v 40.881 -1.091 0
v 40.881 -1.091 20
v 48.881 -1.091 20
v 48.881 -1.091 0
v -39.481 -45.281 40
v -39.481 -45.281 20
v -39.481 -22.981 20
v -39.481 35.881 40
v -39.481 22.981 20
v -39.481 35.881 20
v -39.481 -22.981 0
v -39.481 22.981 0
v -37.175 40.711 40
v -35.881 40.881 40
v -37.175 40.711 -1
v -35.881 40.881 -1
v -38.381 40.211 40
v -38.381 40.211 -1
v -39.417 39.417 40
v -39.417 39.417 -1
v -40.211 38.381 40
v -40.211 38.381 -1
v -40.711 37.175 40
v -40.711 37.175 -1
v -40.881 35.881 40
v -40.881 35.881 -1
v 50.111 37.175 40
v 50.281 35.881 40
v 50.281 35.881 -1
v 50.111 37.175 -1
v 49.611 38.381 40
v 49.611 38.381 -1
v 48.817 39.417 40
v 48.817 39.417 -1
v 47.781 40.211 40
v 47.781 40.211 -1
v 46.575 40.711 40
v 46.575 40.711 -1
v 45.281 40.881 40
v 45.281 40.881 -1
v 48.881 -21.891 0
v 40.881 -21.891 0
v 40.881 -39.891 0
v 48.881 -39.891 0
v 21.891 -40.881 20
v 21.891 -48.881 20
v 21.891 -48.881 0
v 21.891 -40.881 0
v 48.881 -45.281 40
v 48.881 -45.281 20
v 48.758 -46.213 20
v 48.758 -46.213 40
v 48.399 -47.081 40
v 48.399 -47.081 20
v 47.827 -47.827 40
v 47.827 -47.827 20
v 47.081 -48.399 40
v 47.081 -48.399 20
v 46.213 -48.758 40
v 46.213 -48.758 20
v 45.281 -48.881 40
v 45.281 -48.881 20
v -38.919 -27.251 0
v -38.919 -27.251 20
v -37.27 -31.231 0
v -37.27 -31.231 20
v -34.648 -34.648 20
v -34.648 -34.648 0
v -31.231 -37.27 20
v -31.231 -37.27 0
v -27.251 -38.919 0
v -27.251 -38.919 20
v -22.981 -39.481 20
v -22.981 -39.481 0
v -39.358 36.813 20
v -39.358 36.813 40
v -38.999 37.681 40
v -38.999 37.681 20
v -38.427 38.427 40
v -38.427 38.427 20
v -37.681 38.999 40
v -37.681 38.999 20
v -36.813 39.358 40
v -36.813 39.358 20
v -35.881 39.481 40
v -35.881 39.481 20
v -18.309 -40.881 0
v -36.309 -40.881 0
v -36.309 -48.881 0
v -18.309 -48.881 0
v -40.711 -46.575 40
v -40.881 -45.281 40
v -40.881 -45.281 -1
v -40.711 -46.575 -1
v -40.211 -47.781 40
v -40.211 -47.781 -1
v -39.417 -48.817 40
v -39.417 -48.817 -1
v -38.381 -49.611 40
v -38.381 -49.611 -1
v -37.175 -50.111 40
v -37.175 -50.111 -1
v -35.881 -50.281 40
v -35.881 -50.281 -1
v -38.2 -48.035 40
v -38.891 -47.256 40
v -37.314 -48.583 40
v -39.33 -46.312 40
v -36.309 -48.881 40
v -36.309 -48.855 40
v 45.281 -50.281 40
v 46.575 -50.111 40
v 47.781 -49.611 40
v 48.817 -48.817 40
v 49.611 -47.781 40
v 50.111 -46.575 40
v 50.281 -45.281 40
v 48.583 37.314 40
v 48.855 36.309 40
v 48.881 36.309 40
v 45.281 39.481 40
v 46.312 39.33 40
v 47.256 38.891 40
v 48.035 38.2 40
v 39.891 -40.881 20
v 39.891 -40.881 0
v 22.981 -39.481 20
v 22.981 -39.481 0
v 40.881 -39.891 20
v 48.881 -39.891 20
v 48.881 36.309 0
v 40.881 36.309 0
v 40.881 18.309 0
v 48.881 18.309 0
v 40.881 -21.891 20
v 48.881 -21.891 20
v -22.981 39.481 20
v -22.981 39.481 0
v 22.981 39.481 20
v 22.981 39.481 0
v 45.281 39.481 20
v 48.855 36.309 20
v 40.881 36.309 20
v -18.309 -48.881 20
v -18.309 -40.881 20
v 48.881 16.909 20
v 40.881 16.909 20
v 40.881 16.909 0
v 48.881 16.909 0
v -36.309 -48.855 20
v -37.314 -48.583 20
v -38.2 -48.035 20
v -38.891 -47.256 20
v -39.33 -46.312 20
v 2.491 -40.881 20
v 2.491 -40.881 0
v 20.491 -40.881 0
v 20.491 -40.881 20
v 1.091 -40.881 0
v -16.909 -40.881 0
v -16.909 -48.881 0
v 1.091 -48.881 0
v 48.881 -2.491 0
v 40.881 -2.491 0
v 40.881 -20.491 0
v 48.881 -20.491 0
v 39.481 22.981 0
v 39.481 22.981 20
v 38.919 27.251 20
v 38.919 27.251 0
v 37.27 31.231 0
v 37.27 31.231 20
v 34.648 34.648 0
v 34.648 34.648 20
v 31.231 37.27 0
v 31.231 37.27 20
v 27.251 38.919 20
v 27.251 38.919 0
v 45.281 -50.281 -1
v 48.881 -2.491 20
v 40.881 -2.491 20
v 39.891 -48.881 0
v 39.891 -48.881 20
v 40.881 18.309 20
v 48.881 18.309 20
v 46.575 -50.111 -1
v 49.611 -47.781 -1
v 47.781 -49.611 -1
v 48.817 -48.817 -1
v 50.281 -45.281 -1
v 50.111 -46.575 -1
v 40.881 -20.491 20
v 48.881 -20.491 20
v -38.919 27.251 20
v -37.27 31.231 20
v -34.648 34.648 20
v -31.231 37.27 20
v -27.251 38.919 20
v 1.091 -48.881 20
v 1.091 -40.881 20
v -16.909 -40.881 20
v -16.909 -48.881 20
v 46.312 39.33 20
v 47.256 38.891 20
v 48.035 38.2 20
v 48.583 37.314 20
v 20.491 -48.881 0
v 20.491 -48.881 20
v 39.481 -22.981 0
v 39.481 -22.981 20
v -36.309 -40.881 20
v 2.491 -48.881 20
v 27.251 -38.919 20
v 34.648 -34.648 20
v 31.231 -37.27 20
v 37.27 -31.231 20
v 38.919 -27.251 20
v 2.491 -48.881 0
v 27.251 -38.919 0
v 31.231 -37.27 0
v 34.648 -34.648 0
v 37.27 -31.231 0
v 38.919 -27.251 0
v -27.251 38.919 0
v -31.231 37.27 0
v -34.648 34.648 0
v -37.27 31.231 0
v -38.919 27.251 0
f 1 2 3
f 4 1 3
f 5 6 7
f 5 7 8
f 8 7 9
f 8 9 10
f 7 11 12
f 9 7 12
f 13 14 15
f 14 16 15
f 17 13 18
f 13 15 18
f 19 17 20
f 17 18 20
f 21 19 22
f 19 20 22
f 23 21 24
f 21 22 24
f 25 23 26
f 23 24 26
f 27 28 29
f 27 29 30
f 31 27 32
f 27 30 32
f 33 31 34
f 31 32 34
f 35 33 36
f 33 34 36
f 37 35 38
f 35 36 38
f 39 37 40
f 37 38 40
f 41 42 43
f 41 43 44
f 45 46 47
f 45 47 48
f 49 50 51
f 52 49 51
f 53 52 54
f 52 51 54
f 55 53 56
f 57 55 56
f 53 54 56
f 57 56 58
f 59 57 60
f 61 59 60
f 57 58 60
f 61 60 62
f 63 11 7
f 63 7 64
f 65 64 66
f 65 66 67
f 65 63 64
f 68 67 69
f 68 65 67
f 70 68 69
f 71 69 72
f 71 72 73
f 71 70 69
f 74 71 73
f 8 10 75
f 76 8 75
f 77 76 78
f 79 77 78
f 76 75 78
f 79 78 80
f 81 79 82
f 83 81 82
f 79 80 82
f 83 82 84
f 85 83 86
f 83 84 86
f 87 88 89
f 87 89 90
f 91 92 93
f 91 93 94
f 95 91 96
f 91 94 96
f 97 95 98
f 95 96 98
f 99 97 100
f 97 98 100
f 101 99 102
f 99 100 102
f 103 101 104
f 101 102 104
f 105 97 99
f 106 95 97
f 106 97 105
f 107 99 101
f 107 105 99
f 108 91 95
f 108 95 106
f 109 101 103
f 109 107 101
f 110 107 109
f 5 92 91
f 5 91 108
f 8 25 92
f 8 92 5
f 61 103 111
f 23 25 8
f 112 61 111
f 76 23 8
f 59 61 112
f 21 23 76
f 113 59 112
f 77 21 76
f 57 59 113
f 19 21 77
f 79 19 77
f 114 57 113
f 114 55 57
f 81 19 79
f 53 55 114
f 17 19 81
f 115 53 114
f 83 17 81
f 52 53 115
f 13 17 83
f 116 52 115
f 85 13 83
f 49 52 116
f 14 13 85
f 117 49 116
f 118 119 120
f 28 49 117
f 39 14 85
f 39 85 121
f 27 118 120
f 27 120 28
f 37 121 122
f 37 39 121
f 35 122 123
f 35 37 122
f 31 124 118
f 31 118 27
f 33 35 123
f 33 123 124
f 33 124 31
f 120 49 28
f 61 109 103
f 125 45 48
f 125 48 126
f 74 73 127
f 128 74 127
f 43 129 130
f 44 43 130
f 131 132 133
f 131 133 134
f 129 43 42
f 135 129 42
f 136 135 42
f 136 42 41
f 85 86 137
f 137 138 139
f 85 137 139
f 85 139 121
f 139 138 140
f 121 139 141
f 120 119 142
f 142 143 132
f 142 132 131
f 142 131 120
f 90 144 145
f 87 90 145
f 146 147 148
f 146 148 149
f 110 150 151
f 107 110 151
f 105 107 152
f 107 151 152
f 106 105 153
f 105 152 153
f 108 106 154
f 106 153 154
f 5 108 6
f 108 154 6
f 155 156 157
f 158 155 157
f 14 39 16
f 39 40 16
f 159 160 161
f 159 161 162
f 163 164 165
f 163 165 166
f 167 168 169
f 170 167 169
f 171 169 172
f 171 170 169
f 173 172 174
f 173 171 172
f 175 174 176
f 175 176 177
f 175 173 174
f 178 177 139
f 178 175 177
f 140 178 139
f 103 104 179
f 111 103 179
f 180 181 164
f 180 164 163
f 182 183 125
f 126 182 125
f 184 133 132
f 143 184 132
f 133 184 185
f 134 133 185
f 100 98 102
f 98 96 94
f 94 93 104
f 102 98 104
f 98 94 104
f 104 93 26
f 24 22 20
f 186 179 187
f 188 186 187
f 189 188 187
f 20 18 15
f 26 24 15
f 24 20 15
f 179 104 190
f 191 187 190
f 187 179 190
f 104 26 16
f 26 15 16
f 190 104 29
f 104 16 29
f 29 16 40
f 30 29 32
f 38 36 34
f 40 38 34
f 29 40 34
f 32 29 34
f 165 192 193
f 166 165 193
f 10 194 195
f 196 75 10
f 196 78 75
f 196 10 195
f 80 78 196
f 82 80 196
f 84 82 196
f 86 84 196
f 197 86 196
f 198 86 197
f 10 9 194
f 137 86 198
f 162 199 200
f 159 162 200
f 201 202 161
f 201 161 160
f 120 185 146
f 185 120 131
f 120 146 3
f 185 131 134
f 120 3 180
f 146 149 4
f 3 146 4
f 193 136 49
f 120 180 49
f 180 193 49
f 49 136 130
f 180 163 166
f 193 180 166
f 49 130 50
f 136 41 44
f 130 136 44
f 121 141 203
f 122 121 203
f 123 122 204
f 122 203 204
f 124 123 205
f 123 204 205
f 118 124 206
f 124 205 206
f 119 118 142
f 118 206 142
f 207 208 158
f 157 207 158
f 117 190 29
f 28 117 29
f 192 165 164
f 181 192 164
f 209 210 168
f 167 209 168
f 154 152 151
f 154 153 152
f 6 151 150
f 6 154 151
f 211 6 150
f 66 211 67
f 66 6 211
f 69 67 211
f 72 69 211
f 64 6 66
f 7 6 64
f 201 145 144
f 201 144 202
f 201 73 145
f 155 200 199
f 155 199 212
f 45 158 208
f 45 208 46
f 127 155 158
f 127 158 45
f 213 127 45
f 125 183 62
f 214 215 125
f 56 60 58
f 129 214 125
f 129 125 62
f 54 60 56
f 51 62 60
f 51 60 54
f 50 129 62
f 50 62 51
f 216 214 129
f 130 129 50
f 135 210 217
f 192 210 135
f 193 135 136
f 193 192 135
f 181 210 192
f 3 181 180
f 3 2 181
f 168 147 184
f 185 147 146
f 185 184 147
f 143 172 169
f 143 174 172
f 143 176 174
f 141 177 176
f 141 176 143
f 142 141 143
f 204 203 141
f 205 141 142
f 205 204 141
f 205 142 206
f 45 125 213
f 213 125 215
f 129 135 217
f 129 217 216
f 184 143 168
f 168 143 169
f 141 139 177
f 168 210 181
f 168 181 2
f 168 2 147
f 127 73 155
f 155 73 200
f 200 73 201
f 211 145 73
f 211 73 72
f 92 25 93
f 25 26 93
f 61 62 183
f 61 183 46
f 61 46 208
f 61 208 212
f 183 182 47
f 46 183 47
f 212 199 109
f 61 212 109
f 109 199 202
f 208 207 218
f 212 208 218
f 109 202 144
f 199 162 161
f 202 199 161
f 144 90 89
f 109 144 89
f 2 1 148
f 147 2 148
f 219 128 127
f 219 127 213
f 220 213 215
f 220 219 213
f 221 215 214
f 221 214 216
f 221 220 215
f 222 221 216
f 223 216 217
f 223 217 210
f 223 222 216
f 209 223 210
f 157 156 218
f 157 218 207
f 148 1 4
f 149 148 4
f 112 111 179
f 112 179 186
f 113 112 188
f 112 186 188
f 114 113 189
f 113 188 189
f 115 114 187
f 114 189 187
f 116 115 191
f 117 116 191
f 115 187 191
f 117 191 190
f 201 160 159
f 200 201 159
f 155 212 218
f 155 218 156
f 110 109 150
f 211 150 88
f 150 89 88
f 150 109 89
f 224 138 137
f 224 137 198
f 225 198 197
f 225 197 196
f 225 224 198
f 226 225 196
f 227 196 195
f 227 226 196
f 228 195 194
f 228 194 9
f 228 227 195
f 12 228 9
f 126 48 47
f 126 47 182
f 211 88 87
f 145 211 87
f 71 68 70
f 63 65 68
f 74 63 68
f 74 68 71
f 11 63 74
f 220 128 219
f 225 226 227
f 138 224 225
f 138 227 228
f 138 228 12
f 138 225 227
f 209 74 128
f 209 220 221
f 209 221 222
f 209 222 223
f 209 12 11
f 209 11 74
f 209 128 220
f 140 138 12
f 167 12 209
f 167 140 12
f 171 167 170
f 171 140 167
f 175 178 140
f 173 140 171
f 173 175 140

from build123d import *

# Parameters (mm, degrees)
F0_W     = 18
F0_H     = 8
F0_R     = 16.5
F0_W_2   = 8
F0_H_2   = 18
F1_DEPTH = 1
F2_DEPTH = 20
F4_DEPTH = 20
F6_DEPTH = 20


with BuildPart() as f1:
    # F0 (on Top) → F1 (new body)
    with BuildSketch(Plane.XY):
        with BuildLine():
            Line((45.2809703886, 40.8809703886), (-35.8809703886, 40.8809703886))
            ThreePointArc((-35.8809703886, 40.8809703886), (-39.4165042945, 39.4165042945), (-40.8809703886, 35.8809703886))
            Line((-40.8809703886, 35.8809703886), (-40.8809703886, -45.2809703886))
            ThreePointArc((-40.8809703886, -45.2809703886), (-39.4165042945, -48.8165042945), (-35.8809703886, -50.2809703886))
            Line((-35.8809703886, -50.2809703886), (45.2809703886, -50.2809703886))
            ThreePointArc((45.2809703886, -50.2809703886), (48.8165042945, -48.8165042945), (50.2809703886, -45.2809703886))
            Line((50.2809703886, -45.2809703886), (50.2809703886, 35.8809703886))
            ThreePointArc((50.2809703886, 35.8809703886), (48.8165042945, 39.4165042945), (45.2809703886, 40.8809703886))
        make_face()
        with Locations((-27.3089791051, -44.8809703886)):
            Rectangle(F0_W, F0_H, mode=Mode.SUBTRACT)
        with Locations((-7.9089791051, -44.8809703886)):
            Rectangle(F0_W, F0_H, mode=Mode.SUBTRACT)
        with Locations((-22.9809703886, -22.9809703886)):
            Circle(F0_R, mode=Mode.SUBTRACT)
        with Locations((11.4910208949, -44.8809703886)):
            Rectangle(F0_W, F0_H, mode=Mode.SUBTRACT)
        with Locations((30.8910208949, -44.8809703886)):
            Rectangle(F0_W, F0_H, mode=Mode.SUBTRACT)
        with Locations((44.8809703886, -30.8910208949)):
            Rectangle(F0_W_2, F0_H_2, mode=Mode.SUBTRACT)
        with Locations((22.9809703886, -22.9809703886)):
            Circle(F0_R, mode=Mode.SUBTRACT)
        with Locations((44.8809703886, -11.4910208949)):
            Rectangle(F0_W_2, F0_H_2, mode=Mode.SUBTRACT)
        with Locations((-22.9809703886, 22.9809703886)):
            Circle(F0_R, mode=Mode.SUBTRACT)
        with Locations((44.8809703886, 7.9089791051)):
            Rectangle(F0_W_2, F0_H_2, mode=Mode.SUBTRACT)
        with Locations((22.9809703886, 22.9809703886)):
            Circle(F0_R, mode=Mode.SUBTRACT)
        with Locations((44.8809703886, 27.3089791051)):
            Rectangle(F0_W_2, F0_H_2, mode=Mode.SUBTRACT)
        with Locations((-22.9809703886, 22.9809703886)):
            Circle(F0_R)
        with Locations((22.9809703886, 22.9809703886)):
            Circle(F0_R)
        with Locations((22.9809703886, -22.9809703886)):
            Circle(F0_R)
        with Locations((-22.9809703886, -22.9809703886)):
            Circle(F0_R)
        with Locations((44.8809703886, 27.3089791051)):
            Rectangle(F0_W_2, F0_H_2)
        with Locations((44.8809703886, 7.9089791051)):
            Rectangle(F0_W_2, F0_H_2)
        with Locations((44.8809703886, -11.4910208949)):
            Rectangle(F0_W_2, F0_H_2)
        with Locations((44.8809703886, -30.8910208949)):
            Rectangle(F0_W_2, F0_H_2)
        with Locations((30.8910208949, -44.8809703886)):
            Rectangle(F0_W, F0_H)
        with Locations((11.4910208949, -44.8809703886)):
            Rectangle(F0_W, F0_H)
        with Locations((-7.9089791051, -44.8809703886)):
            Rectangle(F0_W, F0_H)
        with Locations((-27.3089791051, -44.8809703886)):
            Rectangle(F0_W, F0_H)
    extrude(amount=-F1_DEPTH)

    # F0 (on Top) → F2 (join)
    with BuildSketch(Plane.XY):
        with BuildLine():
            Line((45.2809703886, 40.8809703886), (-35.8809703886, 40.8809703886))
            ThreePointArc((-35.8809703886, 40.8809703886), (-39.4165042945, 39.4165042945), (-40.8809703886, 35.8809703886))
            Line((-40.8809703886, 35.8809703886), (-40.8809703886, -45.2809703886))
            ThreePointArc((-40.8809703886, -45.2809703886), (-39.4165042945, -48.8165042945), (-35.8809703886, -50.2809703886))
            Line((-35.8809703886, -50.2809703886), (45.2809703886, -50.2809703886))
            ThreePointArc((45.2809703886, -50.2809703886), (48.8165042945, -48.8165042945), (50.2809703886, -45.2809703886))
            Line((50.2809703886, -45.2809703886), (50.2809703886, 35.8809703886))
            ThreePointArc((50.2809703886, 35.8809703886), (48.8165042945, 39.4165042945), (45.2809703886, 40.8809703886))
        make_face()
        with Locations((-27.3089791051, -44.8809703886)):
            Rectangle(F0_W, F0_H, mode=Mode.SUBTRACT)
        with Locations((-7.9089791051, -44.8809703886)):
            Rectangle(F0_W, F0_H, mode=Mode.SUBTRACT)
        with Locations((-22.9809703886, -22.9809703886)):
            Circle(F0_R, mode=Mode.SUBTRACT)
        with Locations((11.4910208949, -44.8809703886)):
            Rectangle(F0_W, F0_H, mode=Mode.SUBTRACT)
        with Locations((30.8910208949, -44.8809703886)):
            Rectangle(F0_W, F0_H, mode=Mode.SUBTRACT)
        with Locations((44.8809703886, -30.8910208949)):
            Rectangle(F0_W_2, F0_H_2, mode=Mode.SUBTRACT)
        with Locations((22.9809703886, -22.9809703886)):
            Circle(F0_R, mode=Mode.SUBTRACT)
        with Locations((44.8809703886, -11.4910208949)):
            Rectangle(F0_W_2, F0_H_2, mode=Mode.SUBTRACT)
        with Locations((-22.9809703886, 22.9809703886)):
            Circle(F0_R, mode=Mode.SUBTRACT)
        with Locations((44.8809703886, 7.9089791051)):
            Rectangle(F0_W_2, F0_H_2, mode=Mode.SUBTRACT)
        with Locations((22.9809703886, 22.9809703886)):
            Circle(F0_R, mode=Mode.SUBTRACT)
        with Locations((44.8809703886, 27.3089791051)):
            Rectangle(F0_W_2, F0_H_2, mode=Mode.SUBTRACT)
    extrude(amount=F2_DEPTH)

    # F3 (on face) → F4 (cut, through all)
    with BuildSketch(Plane.XY.offset(20)):
        with BuildLine():
            Line((22.9809703886, 39.4809703886), (-22.9809703886, 39.4809703886))
            ThreePointArc((-22.9809703886, 39.4809703886), (-11.313708499, 34.6482322781), (-6.4809703886, 22.9809703886))
            ThreePointArc((-6.4809703886, 22.9809703886), (-22.9809703886, 6.4809703886), (-39.4809703886, 22.9809703886))
            Line((-39.4809703886, 22.9809703886), (-39.4809703886, -22.9809703886))
            ThreePointArc((-39.4809703886, -22.9809703886), (-22.9809703886, -6.4809703886), (-6.4809703886, -22.9809703886))
            ThreePointArc((-6.4809703886, -22.9809703886), (-11.313708499, -34.6482322781), (-22.9809703886, -39.4809703886))
            Line((-22.9809703886, -39.4809703886), (22.9809703886, -39.4809703886))
            ThreePointArc((22.9809703886, -39.4809703886), (11.313708499, -11.313708499), (39.4809703886, -22.9809703886))
            Line((39.4809703886, -22.9809703886), (39.4809703886, 22.9809703886))
            ThreePointArc((39.4809703886, 22.9809703886), (11.313708499, 11.313708499), (22.9809703886, 39.4809703886))
        make_face()
    extrude(amount=-F4_DEPTH, mode=Mode.SUBTRACT)

    # F5 (on face) → F6 (join)
    with BuildSketch(Plane.XY.offset(20)):
        with BuildLine():
            ThreePointArc((50.2809703886, 35.8809703886), (48.8165042945, 39.4165042945), (45.2809703886, 40.8809703886))
            Line((45.2809703886, 40.8809703886), (-35.8809703886, 40.8809703886))
            ThreePointArc((-35.8809703886, 40.8809703886), (-39.4165042945, 39.4165042945), (-40.8809703886, 35.8809703886))
            Line((-40.8809703886, 35.8809703886), (-40.8809703886, -45.2809703886))
            ThreePointArc((-40.8809703886, -45.2809703886), (-39.4165042945, -48.8165042945), (-35.8809703886, -50.2809703886))
            Line((-35.8809703886, -50.2809703886), (45.2809703886, -50.2809703886))
            ThreePointArc((45.2809703886, -50.2809703886), (48.8165042945, -48.8165042945), (50.2809703886, -45.2809703886))
            Line((50.2809703886, -45.2809703886), (50.2809703886, 35.8809703886))
        make_face()
        with BuildLine():
            ThreePointArc((-39.4809703886, 35.8809703886), (-38.4265548008, 38.4265548008), (-35.8809703886, 39.4809703886))
            Line((-35.8809703886, 39.4809703886), (-22.9809703886, 39.4809703886))
            Line((-22.9809703886, 39.4809703886), (22.9809703886, 39.4809703886))
            Line((22.9809703886, 39.4809703886), (45.2809703886, 39.4809703886))
            ThreePointArc((45.2809703886, 39.4809703886), (47.6704440357, 38.5736299827), (48.8554365779, 36.3089791051))
            Line((48.8554365779, 36.3089791051), (48.8809703886, 36.3089791051))
            Line((48.8809703886, 36.3089791051), (48.8809703886, 35.8809703886))
            Line((48.8809703886, 35.8809703886), (48.8809703886, 18.3089791051))
            Line((48.8809703886, 18.3089791051), (48.8809703886, 16.9089791051))
            Line((48.8809703886, 16.9089791051), (48.8809703886, -1.0910208949))
            Line((48.8809703886, -1.0910208949), (48.8809703886, -2.4910208949))
            Line((48.8809703886, -2.4910208949), (48.8809703886, -20.4910208949))
            Line((48.8809703886, -20.4910208949), (48.8809703886, -21.8910208949))
            Line((48.8809703886, -21.8910208949), (48.8809703886, -39.8910208949))
            Line((48.8809703886, -39.8910208949), (48.8809703886, -45.2809703886))
            ThreePointArc((48.8809703886, -45.2809703886), (47.8265548008, -47.8265548008), (45.2809703886, -48.8809703886))
            Line((45.2809703886, -48.8809703886), (39.8910208949, -48.8809703886))
            Line((39.8910208949, -48.8809703886), (21.8910208949, -48.8809703886))
            Line((21.8910208949, -48.8809703886), (20.4910208949, -48.8809703886))
            Line((20.4910208949, -48.8809703886), (2.4910208949, -48.8809703886))
            Line((2.4910208949, -48.8809703886), (1.0910208949, -48.8809703886))
            Line((1.0910208949, -48.8809703886), (-16.9089791051, -48.8809703886))
            Line((-16.9089791051, -48.8809703886), (-18.3089791051, -48.8809703886))
            Line((-18.3089791051, -48.8809703886), (-35.8809703886, -48.8809703886))
            Line((-35.8809703886, -48.8809703886), (-36.3089791051, -48.8809703886))
            Line((-36.3089791051, -48.8809703886), (-36.3089791051, -48.8554365779))
            ThreePointArc((-36.3089791051, -48.8554365779), (-38.5736299827, -47.6704440357), (-39.4809703886, -45.2809703886))
            Line((-39.4809703886, -45.2809703886), (-39.4809703886, -22.9809703886))
            Line((-39.4809703886, -22.9809703886), (-39.4809703886, 22.9809703886))
            Line((-39.4809703886, 22.9809703886), (-39.4809703886, 35.8809703886))
        make_face(mode=Mode.SUBTRACT)
    extrude(amount=F6_DEPTH)


solid = f1.part
